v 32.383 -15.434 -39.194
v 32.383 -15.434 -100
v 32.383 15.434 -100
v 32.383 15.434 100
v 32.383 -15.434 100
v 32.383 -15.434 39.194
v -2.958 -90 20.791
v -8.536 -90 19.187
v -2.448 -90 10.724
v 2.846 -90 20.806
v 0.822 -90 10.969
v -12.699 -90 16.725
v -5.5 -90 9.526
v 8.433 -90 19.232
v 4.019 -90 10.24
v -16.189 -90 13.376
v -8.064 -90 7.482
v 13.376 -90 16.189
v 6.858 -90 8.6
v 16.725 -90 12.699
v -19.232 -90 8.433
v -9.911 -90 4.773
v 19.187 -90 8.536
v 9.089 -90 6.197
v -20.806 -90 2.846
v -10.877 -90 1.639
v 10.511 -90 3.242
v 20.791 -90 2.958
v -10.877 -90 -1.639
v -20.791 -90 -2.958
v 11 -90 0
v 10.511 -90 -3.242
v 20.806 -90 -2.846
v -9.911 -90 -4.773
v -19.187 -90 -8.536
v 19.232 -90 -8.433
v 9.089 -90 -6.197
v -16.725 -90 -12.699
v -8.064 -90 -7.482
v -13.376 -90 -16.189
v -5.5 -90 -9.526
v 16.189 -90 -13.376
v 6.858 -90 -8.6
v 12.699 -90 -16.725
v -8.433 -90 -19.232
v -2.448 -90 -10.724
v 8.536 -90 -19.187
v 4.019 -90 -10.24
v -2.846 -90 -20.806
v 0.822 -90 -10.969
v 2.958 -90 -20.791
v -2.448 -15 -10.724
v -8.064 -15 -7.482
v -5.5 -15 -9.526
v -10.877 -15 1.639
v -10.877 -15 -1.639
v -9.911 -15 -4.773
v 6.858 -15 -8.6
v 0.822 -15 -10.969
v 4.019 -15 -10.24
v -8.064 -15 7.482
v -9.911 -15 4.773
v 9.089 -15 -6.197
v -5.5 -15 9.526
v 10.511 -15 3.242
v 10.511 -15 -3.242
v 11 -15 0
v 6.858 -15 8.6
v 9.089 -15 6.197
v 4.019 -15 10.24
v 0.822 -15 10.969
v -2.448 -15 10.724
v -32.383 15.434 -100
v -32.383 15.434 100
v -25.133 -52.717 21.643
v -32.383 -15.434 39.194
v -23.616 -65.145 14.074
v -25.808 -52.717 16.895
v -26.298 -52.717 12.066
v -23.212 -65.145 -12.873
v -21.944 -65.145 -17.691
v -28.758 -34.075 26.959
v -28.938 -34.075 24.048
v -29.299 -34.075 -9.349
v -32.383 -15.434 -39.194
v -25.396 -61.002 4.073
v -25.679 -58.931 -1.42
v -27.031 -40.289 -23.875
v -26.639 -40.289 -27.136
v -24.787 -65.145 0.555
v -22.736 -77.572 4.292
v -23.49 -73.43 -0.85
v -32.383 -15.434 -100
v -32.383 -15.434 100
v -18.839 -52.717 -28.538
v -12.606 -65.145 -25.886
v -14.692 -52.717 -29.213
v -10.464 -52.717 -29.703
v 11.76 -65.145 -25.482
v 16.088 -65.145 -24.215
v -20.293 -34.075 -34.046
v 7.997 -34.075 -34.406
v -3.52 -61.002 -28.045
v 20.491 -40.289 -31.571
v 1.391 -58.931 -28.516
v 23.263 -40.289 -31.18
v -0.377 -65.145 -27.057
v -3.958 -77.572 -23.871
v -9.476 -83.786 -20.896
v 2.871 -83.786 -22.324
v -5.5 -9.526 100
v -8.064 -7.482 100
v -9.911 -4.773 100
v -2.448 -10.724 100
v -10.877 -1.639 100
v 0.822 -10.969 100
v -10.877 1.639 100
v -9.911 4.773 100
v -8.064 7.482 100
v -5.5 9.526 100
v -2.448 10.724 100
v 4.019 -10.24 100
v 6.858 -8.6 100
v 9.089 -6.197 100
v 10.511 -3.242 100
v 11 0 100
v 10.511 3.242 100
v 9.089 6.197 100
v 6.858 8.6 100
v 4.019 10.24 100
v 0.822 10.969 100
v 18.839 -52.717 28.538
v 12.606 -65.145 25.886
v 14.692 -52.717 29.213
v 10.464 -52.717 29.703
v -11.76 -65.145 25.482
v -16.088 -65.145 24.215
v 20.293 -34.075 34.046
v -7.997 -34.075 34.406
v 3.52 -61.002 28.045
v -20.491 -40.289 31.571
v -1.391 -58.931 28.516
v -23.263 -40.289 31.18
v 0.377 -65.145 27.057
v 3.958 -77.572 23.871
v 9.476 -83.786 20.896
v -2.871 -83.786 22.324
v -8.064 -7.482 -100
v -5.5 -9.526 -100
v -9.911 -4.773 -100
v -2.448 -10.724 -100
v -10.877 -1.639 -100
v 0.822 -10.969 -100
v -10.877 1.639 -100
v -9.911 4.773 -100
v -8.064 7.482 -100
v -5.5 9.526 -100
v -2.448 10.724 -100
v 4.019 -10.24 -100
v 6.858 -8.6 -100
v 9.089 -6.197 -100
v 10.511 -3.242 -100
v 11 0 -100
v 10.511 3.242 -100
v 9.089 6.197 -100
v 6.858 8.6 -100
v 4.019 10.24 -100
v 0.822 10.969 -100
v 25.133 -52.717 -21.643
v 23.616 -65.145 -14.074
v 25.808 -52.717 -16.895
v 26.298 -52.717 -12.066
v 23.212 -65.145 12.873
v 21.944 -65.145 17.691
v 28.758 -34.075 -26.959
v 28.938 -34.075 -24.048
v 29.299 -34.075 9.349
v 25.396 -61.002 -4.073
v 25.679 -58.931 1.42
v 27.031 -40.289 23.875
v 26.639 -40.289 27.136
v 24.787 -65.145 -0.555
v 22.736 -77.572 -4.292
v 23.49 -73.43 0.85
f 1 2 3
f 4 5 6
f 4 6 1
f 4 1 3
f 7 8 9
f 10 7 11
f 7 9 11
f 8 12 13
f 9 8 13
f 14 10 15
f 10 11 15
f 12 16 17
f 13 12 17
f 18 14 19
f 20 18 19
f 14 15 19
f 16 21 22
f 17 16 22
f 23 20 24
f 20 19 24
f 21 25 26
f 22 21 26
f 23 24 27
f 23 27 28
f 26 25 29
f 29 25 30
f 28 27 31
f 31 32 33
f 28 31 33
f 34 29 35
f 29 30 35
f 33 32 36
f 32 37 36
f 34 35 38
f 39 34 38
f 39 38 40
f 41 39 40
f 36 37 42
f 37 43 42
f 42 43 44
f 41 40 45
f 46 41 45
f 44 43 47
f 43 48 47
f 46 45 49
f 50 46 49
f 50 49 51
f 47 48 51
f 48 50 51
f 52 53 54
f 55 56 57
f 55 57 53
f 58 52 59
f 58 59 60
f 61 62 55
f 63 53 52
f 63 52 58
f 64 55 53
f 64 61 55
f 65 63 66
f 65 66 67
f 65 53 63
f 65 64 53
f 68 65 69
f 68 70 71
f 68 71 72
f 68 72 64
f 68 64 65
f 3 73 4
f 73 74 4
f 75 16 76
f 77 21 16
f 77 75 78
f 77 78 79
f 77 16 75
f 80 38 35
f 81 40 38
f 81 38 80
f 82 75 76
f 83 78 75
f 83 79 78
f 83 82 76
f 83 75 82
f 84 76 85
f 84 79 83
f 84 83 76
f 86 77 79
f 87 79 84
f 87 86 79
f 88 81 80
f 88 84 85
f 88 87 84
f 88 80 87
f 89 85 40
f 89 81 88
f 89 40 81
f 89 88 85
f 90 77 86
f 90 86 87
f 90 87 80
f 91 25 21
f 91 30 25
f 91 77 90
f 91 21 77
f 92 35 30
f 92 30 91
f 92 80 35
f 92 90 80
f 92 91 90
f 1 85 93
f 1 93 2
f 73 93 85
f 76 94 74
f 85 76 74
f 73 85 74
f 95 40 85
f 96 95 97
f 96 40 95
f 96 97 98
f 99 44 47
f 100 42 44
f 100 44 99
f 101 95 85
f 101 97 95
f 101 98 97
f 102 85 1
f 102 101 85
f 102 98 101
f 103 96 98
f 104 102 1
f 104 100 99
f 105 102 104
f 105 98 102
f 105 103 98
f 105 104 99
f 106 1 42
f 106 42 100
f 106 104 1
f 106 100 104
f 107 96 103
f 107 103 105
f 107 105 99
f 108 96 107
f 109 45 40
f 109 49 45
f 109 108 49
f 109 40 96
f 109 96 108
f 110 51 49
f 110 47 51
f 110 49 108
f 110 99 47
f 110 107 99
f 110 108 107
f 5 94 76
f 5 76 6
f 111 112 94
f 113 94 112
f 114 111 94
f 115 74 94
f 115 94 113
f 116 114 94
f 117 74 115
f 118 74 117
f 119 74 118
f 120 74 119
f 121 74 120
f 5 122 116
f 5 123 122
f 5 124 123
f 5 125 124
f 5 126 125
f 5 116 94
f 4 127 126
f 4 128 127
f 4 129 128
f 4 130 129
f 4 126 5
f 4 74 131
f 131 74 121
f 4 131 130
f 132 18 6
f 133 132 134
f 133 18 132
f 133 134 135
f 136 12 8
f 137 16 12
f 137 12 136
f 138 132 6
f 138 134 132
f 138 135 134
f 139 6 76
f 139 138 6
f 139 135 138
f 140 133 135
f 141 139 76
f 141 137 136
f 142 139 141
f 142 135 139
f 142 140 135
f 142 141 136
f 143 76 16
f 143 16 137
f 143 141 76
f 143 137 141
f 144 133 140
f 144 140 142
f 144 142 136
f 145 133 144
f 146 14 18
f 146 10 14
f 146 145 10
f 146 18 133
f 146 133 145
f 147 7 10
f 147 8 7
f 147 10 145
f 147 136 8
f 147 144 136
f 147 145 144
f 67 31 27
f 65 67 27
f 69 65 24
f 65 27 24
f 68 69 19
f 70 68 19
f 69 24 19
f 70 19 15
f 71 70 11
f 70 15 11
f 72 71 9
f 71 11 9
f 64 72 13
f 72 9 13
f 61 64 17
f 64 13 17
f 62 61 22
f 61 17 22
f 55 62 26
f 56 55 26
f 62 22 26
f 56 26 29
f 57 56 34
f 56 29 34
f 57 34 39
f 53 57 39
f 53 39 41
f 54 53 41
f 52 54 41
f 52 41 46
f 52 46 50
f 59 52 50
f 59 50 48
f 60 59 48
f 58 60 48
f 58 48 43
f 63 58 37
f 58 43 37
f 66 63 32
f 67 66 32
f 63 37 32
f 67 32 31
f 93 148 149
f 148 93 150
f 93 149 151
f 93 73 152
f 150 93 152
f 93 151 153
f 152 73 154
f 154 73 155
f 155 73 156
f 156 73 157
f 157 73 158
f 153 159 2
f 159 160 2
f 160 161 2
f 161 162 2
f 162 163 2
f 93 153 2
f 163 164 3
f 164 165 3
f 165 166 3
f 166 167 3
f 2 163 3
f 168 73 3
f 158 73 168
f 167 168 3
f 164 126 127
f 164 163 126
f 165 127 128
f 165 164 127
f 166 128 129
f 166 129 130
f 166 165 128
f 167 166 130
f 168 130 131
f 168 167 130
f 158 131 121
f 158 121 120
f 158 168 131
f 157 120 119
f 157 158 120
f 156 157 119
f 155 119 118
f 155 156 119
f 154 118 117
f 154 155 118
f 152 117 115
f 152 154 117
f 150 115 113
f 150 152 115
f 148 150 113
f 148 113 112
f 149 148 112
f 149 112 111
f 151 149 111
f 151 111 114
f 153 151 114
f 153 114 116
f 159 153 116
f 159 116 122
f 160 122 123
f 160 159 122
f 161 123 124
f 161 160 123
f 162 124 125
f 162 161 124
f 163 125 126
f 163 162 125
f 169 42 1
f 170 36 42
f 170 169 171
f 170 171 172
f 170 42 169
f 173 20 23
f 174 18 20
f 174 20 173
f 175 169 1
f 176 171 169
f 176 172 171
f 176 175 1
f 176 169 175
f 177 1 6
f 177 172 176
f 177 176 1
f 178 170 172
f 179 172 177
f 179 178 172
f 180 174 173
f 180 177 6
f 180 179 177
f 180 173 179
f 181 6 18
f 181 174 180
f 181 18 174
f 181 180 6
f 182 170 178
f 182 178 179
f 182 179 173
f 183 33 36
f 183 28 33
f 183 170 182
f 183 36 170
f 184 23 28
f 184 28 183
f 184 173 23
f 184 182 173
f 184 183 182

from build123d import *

# Parameters (mm, degrees)
F0_W     = 64.7669136524
F0_H     = 30.8674070984
F0_R     = 11
F1_DEPTH = 100
F4_W     = 64.7669136524
F4_H     = 78.3874105722
F6_R     = 11
F7_DEPTH = 75


# Not quite as in the source:
# - the arcs of a loft's sections are written as splines that run evenly, so that the points pair up as in the source's solid


with BuildPart() as f1:
    # F0 (on Top) → F1 (new body, symmetric)
    with BuildSketch(Plane.XY):
        Rectangle(F0_W, F0_H)
        Circle(F0_R, mode=Mode.SUBTRACT)
    extrude(amount=F1_DEPTH, both=True)

    # F4 (on face) → F5 section 0
    with BuildSketch(Plane.XZ.offset(15.4337035492)):
        Rectangle(F4_W, F4_H)
    # F3 (on offset) → F5 section 1
    with BuildSketch(Plane.XZ.offset(90)):
        with BuildLine():
            add(Edge.make_bspline(
                [(13.3759952004, 16.1889700845), (12.3164295861, 17.0644269232), (11.1706673311, 17.8355065906), (8.7506683017, 19.1393549588), (7.4764913666, 19.6720914194), (4.8486237419, 20.4787683169), (3.4949980316, 20.7526888071), (0.7602492908, 21.0311940931), (-0.6208061176, 21.0357720023), (-3.3573411141, 20.7754028748), (-4.7127530359, 20.5104622764), (-7.3459107829, 19.721224575), (-8.623591498, 19.1969469876), (-11.0521812199, 17.9091706745), (-12.203030175, 17.1457037918), (-14.3337225308, 15.4088773887), (-15.3135132459, 14.4355608147), (-16.1889700845, 13.3759952004)],
                knots=[0, 0, 0, 0, 0.125, 0.125, 0.25, 0.25, 0.375, 0.375, 0.5, 0.5, 0.625, 0.625, 0.75, 0.75, 0.875, 0.875, 1, 1, 1, 1], degree=3))
            add(Edge.make_bspline(
                [(-16.1889700845, 13.3759952004), (-17.0644269232, 12.3164295861), (-17.8355065906, 11.1706673311), (-19.1393549588, 8.7506683017), (-19.6720914194, 7.4764913666), (-20.4787683169, 4.8486237419), (-20.7526888071, 3.4949980316), (-21.0311940931, 0.7602492908), (-21.0357720023, -0.6208061176), (-20.7754028748, -3.3573411141), (-20.5104622764, -4.7127530359), (-19.721224575, -7.3459107829), (-19.1969469876, -8.623591498), (-17.9091706745, -11.0521812199), (-17.1457037918, -12.203030175), (-15.4088773887, -14.3337225308), (-14.4355608147, -15.3135132459), (-13.3759952004, -16.1889700845)],
                knots=[0, 0, 0, 0, 0.125, 0.125, 0.25, 0.25, 0.375, 0.375, 0.5, 0.5, 0.625, 0.625, 0.75, 0.75, 0.875, 0.875, 1, 1, 1, 1], degree=3))
            add(Edge.make_bspline(
                [(-13.3759952004, -16.1889700845), (-12.3164295861, -17.0644269232), (-11.1706673311, -17.8355065906), (-8.7506683017, -19.1393549588), (-7.4764913666, -19.6720914194), (-4.8486237419, -20.4787683169), (-3.4949980316, -20.7526888071), (-0.7602492908, -21.0311940931), (0.6208061176, -21.0357720023), (3.3573411141, -20.7754028748), (4.7127530359, -20.5104622764), (7.3459107829, -19.721224575), (8.623591498, -19.1969469876), (11.0521812199, -17.9091706745), (12.203030175, -17.1457037918), (14.3337225308, -15.4088773887), (15.3135132459, -14.4355608147), (16.1889700845, -13.3759952004)],
                knots=[0, 0, 0, 0, 0.125, 0.125, 0.25, 0.25, 0.375, 0.375, 0.5, 0.5, 0.625, 0.625, 0.75, 0.75, 0.875, 0.875, 1, 1, 1, 1], degree=3))
            add(Edge.make_bspline(
                [(16.1889700845, -13.3759952004), (17.0644269232, -12.3164295861), (17.8355065906, -11.1706673311), (19.1393549588, -8.7506683017), (19.6720914194, -7.4764913666), (20.4787683169, -4.8486237419), (20.7526888071, -3.4949980316), (21.0311940931, -0.7602492908), (21.0357720023, 0.6208061176), (20.7754028748, 3.3573411141), (20.5104622764, 4.7127530359), (19.721224575, 7.3459107829), (19.1969469876, 8.623591498), (17.9091706745, 11.0521812199), (17.1457037918, 12.203030175), (15.4088773887, 14.3337225308), (14.4355608147, 15.3135132459), (13.3759952004, 16.1889700845)],
                knots=[0, 0, 0, 0, 0.125, 0.125, 0.25, 0.25, 0.375, 0.375, 0.5, 0.5, 0.625, 0.625, 0.75, 0.75, 0.875, 0.875, 1, 1, 1, 1], degree=3))
        make_face()
    loft(ruled=True)

    # F6 (on face) → F7 (cut)
    with BuildSketch(Plane.XZ.offset(90)):
        Circle(F6_R)
    extrude(amount=-F7_DEPTH, mode=Mode.SUBTRACT)


solid = f1.part
